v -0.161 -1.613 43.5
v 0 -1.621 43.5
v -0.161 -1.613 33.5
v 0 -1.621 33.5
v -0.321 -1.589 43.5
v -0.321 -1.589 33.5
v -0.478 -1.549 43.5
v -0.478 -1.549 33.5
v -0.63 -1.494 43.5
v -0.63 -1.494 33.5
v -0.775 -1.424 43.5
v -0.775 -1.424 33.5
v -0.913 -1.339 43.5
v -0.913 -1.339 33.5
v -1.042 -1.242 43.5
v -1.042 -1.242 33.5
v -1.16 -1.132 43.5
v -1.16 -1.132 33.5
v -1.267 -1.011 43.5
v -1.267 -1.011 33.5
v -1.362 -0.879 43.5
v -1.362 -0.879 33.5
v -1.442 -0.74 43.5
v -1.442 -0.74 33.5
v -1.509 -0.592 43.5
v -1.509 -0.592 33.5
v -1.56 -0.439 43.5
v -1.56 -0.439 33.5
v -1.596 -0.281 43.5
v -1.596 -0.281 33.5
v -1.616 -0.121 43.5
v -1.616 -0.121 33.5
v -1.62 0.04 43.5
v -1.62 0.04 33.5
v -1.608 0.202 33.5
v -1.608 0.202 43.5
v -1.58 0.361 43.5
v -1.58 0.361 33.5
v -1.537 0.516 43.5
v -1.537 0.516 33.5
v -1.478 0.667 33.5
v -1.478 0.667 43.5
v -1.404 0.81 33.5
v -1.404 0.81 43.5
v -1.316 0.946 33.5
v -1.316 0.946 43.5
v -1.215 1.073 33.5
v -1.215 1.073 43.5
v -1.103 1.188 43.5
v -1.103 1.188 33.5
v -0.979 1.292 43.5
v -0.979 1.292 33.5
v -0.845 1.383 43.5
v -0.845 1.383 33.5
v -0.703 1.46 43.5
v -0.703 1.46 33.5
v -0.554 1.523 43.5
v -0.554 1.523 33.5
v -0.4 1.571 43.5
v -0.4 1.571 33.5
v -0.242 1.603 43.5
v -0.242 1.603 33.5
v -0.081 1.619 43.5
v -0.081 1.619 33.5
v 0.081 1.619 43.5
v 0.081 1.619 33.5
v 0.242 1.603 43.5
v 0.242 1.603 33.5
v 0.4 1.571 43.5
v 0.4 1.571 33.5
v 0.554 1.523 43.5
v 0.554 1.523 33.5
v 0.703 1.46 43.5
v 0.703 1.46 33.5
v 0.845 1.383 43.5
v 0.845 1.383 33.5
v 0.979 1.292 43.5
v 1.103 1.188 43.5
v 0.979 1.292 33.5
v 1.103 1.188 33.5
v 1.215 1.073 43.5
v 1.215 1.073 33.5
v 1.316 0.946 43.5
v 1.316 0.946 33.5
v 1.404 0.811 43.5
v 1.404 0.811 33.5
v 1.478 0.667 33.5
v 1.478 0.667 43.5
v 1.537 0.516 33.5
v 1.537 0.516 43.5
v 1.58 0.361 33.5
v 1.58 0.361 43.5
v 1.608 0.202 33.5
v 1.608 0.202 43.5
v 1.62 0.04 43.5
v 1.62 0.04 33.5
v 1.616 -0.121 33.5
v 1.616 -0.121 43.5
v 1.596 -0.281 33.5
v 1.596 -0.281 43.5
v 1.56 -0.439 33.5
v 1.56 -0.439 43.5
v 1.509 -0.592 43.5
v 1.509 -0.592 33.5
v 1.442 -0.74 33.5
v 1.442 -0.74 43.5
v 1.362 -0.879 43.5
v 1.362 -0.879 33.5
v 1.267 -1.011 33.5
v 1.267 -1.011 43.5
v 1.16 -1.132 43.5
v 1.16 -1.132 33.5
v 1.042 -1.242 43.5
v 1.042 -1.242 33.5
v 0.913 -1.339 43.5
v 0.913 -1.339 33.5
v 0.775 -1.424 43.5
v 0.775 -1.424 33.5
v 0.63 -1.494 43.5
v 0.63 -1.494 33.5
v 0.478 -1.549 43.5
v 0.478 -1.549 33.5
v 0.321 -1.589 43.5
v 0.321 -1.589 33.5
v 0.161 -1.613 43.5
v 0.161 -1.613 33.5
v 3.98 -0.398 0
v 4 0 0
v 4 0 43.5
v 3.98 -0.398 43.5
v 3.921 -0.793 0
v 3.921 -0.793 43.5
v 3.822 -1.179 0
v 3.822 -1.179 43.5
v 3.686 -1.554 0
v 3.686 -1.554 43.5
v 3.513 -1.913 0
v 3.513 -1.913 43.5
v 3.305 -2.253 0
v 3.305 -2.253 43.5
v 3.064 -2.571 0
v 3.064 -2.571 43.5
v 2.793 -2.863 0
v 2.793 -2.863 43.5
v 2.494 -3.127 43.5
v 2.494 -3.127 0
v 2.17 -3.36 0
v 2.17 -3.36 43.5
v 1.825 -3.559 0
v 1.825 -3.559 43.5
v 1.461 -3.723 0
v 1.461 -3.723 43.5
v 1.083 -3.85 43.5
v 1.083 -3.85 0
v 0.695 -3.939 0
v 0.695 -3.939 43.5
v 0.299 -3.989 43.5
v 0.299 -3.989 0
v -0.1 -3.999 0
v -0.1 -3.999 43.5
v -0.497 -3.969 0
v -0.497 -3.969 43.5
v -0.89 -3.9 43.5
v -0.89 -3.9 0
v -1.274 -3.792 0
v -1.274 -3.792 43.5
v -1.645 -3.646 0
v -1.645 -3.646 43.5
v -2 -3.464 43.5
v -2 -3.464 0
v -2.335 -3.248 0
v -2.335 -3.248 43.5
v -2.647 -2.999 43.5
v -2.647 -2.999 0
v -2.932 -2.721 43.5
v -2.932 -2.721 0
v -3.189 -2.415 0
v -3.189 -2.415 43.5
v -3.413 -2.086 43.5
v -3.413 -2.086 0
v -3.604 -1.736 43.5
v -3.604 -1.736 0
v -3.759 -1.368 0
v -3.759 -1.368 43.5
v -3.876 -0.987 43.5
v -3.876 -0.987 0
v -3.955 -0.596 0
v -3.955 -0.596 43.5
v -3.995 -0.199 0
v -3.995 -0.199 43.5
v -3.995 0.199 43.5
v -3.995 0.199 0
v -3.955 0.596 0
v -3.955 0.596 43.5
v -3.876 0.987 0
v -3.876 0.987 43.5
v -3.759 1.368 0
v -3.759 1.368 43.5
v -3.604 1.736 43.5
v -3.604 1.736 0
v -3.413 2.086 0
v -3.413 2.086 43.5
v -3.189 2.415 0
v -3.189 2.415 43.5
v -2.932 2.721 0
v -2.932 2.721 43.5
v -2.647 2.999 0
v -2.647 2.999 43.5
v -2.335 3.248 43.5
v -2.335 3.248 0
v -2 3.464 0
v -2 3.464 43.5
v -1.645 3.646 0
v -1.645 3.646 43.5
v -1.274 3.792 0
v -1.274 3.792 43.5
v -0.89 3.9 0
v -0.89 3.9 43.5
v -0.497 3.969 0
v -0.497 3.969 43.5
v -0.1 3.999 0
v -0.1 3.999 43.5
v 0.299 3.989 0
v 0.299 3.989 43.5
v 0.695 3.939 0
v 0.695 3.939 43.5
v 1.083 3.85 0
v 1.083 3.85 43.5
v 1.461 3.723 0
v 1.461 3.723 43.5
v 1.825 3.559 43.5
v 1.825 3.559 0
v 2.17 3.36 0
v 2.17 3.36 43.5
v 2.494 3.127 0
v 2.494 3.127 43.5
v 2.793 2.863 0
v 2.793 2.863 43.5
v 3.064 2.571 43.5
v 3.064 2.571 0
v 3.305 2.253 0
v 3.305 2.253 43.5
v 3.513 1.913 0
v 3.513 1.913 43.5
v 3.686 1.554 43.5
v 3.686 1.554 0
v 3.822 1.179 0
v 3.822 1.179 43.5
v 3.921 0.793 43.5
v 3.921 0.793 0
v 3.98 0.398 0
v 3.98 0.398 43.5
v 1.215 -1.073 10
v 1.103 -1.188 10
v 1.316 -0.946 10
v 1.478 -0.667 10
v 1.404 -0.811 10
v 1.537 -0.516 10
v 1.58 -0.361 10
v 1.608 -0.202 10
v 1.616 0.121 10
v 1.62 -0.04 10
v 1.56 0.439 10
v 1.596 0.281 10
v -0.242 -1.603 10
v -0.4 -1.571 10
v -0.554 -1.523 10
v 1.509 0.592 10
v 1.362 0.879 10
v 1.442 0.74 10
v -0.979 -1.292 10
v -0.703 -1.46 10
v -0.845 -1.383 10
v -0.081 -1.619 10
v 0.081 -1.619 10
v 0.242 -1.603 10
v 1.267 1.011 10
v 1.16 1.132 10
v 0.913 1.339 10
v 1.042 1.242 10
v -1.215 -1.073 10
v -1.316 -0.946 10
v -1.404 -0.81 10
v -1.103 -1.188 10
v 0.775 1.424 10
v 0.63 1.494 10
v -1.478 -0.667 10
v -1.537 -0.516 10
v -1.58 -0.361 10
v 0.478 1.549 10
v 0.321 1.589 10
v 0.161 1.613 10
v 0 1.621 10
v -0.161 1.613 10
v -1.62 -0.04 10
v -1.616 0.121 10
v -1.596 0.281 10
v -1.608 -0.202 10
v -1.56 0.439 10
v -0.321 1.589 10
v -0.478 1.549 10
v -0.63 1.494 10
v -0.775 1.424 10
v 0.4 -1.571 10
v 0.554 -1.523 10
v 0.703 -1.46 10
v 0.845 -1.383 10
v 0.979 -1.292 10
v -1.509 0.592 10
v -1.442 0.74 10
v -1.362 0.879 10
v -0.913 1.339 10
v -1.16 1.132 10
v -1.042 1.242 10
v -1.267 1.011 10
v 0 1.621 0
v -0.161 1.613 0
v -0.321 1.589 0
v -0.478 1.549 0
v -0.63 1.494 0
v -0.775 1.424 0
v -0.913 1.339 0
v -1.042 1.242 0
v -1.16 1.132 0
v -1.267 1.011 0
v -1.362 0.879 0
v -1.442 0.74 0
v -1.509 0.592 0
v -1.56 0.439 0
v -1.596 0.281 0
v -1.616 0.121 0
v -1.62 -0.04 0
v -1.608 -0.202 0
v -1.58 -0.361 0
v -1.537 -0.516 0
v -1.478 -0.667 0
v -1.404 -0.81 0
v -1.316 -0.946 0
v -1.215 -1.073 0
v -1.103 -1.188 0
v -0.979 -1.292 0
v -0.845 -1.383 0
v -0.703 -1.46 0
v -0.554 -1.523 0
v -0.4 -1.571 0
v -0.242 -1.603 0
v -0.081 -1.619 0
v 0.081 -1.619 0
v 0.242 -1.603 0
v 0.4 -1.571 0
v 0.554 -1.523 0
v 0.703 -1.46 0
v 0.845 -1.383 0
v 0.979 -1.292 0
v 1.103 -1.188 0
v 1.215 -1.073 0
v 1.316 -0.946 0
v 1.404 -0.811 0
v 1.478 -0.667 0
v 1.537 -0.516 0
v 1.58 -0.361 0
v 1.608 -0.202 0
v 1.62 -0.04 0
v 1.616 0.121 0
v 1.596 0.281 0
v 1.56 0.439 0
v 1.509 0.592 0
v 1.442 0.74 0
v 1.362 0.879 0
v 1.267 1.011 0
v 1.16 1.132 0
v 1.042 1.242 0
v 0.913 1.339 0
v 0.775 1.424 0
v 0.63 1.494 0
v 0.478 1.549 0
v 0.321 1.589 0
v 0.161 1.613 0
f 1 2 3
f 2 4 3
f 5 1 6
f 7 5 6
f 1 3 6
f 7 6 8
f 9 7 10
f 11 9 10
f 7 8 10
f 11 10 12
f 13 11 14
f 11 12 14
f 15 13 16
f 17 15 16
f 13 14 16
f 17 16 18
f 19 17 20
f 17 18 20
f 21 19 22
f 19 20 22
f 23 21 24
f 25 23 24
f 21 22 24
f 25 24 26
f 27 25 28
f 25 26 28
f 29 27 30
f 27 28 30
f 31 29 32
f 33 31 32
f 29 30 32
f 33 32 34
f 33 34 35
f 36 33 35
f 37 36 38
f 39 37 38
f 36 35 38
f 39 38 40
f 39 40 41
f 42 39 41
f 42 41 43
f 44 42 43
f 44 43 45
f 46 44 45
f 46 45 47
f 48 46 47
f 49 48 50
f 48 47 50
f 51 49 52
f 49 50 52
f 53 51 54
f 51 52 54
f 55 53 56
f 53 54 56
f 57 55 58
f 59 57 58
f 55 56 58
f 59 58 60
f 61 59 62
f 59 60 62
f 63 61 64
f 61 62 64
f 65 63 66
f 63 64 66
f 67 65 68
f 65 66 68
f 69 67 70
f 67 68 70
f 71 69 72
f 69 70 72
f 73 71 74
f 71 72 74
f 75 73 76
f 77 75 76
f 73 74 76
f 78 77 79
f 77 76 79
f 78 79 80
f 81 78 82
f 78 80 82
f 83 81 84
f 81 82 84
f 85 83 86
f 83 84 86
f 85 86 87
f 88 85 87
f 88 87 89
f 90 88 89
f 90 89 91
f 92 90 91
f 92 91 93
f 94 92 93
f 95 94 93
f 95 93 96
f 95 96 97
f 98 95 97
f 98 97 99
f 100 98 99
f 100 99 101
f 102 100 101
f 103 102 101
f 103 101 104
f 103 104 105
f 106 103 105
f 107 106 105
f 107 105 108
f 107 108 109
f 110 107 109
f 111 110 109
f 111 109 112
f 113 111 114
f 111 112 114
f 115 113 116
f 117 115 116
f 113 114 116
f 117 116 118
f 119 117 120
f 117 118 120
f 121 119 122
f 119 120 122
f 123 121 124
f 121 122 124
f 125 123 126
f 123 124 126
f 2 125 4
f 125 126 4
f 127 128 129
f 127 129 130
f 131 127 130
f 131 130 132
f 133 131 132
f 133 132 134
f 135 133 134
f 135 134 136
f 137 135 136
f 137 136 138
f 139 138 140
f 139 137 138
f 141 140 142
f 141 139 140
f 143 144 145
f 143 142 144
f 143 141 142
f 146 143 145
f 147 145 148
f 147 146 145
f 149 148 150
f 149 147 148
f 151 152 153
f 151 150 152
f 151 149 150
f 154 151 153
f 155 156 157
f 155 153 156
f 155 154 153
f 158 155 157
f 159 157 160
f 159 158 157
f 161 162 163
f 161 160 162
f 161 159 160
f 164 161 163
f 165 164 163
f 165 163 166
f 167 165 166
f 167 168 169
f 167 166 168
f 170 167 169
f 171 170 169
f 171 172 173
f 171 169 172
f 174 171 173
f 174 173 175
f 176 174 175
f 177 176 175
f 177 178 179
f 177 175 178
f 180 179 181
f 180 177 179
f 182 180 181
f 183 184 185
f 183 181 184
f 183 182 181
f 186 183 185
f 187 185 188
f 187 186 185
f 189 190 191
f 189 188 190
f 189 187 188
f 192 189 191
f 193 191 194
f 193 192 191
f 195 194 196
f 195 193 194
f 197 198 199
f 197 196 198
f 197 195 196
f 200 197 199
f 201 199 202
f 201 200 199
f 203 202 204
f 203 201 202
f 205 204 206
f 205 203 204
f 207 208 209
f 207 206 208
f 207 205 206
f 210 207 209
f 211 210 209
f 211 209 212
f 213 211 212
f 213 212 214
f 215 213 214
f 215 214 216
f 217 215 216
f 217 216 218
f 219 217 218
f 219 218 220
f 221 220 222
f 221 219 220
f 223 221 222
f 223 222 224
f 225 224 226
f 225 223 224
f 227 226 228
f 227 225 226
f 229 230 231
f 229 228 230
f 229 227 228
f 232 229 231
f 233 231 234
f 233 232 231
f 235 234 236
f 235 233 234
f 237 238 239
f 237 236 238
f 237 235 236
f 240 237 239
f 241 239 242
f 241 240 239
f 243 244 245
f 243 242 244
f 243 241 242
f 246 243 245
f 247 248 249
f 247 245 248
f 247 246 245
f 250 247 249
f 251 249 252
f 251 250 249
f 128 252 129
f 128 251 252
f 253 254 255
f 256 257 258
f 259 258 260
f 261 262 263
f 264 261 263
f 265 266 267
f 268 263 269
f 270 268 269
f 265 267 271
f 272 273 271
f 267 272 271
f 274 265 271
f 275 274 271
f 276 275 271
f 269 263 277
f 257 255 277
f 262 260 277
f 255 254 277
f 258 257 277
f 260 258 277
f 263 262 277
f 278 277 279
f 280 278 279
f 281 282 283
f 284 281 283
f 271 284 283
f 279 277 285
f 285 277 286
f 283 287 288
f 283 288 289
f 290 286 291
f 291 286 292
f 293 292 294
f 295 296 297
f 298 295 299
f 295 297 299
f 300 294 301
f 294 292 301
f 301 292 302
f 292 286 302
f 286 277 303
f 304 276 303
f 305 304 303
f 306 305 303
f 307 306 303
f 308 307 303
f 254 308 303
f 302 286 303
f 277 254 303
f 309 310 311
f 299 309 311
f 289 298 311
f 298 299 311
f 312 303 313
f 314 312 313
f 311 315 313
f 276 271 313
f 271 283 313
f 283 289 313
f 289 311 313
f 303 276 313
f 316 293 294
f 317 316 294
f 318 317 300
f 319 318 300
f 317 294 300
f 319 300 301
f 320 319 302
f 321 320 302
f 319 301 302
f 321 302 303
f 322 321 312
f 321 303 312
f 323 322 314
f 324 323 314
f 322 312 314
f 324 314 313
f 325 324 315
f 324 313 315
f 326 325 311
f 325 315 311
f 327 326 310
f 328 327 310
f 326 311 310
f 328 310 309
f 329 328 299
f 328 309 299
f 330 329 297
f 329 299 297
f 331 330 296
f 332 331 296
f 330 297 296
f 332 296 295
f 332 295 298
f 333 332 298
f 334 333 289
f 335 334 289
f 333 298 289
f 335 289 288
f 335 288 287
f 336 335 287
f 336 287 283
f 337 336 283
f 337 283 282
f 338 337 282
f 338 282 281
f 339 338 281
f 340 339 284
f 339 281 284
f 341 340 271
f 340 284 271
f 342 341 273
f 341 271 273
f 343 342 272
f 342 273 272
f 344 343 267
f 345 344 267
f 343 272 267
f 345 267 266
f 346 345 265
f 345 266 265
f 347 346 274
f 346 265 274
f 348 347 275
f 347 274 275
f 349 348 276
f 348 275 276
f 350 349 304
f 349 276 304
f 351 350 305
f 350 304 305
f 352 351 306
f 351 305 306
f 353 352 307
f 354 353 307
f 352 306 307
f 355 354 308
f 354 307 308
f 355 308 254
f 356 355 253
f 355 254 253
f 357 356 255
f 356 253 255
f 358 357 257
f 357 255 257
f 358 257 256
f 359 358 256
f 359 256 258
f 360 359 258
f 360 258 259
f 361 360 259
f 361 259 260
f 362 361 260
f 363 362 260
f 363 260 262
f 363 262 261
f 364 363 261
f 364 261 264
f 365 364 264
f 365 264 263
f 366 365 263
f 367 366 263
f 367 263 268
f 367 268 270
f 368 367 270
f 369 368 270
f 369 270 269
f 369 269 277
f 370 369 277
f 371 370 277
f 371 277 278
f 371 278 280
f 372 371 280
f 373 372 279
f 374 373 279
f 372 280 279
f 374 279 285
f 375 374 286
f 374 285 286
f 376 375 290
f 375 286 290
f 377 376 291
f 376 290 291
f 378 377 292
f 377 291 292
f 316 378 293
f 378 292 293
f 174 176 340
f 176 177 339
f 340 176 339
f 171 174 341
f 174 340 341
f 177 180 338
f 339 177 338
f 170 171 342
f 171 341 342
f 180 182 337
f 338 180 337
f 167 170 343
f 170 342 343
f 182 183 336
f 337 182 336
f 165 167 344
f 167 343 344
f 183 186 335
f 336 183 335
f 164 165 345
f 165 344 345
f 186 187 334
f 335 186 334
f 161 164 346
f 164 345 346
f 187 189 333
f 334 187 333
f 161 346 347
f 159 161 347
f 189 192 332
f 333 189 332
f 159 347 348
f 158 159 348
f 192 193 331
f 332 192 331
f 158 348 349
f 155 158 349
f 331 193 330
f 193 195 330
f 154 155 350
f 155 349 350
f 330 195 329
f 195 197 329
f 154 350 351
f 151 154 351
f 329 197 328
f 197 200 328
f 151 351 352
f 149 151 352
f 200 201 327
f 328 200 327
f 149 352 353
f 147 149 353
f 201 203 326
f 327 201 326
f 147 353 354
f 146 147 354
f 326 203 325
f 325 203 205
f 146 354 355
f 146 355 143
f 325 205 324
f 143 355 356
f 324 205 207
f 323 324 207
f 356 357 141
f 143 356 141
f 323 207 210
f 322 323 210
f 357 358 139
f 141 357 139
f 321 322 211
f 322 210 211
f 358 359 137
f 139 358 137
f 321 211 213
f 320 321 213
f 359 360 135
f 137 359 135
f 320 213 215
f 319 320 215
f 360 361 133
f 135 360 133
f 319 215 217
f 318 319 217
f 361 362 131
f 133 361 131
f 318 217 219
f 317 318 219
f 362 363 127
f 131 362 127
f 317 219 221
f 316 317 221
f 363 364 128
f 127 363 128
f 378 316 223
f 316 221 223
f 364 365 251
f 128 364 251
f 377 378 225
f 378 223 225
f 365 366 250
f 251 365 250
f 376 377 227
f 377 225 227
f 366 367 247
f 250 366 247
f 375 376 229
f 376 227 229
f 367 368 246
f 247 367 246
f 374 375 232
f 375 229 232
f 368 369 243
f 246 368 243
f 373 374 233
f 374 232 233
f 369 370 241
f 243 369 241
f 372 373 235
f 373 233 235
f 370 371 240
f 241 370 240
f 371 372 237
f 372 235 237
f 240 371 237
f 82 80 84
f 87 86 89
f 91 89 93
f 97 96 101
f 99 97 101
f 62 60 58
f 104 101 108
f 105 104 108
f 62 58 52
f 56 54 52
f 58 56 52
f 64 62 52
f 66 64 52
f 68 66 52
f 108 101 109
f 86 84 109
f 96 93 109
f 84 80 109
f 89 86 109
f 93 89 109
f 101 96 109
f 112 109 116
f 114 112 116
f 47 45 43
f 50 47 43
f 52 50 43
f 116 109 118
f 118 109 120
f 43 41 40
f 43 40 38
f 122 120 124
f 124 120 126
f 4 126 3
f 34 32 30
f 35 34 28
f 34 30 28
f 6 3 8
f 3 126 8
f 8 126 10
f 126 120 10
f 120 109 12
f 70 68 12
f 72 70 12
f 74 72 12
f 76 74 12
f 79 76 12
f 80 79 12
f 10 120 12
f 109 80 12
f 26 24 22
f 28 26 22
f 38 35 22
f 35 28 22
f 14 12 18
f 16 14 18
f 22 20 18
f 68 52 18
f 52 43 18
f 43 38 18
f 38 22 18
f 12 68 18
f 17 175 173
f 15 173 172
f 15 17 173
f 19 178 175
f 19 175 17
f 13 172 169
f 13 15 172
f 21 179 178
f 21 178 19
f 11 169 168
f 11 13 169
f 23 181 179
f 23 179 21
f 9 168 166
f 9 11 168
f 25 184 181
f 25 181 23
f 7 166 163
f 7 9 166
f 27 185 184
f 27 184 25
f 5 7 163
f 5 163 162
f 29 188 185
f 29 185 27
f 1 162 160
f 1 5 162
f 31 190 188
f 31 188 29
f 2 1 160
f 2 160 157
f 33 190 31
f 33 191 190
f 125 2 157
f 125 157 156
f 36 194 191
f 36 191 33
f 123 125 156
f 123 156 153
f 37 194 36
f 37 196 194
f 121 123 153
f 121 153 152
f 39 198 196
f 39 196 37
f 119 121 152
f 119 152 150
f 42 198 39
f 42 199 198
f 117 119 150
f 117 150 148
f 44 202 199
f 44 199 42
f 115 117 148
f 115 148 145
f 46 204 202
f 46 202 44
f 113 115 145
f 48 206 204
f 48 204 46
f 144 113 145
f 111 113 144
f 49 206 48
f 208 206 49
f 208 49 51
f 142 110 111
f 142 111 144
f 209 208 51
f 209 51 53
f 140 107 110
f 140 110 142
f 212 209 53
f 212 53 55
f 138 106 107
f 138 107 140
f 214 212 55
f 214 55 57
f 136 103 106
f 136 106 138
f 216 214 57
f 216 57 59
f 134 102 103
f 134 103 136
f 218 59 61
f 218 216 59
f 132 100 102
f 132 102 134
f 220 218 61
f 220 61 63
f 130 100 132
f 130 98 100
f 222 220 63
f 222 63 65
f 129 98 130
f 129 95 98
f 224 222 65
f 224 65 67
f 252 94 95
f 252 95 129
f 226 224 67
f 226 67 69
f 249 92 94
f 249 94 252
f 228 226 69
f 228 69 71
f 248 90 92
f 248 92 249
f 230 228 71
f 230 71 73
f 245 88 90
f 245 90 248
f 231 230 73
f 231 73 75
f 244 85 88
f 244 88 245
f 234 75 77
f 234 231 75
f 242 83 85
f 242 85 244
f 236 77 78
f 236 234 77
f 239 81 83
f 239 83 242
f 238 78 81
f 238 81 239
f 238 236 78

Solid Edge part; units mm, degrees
sketch "Sketch1" plane through (0, 0, 0) normal (0, 0, 1) x (1, 0, 0)
  circle A0 centre (0, 0) radius 4
extrude "Protrusion1" add sketch "Sketch1" along normal blind 43.5
hole "Hole_3" at (0, 0, 0) direction (0, 0, 1) diameter 3.242 depth 10 thread major 4 thread length 8
hole "Hole_4" at (0, 0, 43.5) direction (0, 0, -1) diameter 3.242 depth 10 thread major 4 thread length 8
